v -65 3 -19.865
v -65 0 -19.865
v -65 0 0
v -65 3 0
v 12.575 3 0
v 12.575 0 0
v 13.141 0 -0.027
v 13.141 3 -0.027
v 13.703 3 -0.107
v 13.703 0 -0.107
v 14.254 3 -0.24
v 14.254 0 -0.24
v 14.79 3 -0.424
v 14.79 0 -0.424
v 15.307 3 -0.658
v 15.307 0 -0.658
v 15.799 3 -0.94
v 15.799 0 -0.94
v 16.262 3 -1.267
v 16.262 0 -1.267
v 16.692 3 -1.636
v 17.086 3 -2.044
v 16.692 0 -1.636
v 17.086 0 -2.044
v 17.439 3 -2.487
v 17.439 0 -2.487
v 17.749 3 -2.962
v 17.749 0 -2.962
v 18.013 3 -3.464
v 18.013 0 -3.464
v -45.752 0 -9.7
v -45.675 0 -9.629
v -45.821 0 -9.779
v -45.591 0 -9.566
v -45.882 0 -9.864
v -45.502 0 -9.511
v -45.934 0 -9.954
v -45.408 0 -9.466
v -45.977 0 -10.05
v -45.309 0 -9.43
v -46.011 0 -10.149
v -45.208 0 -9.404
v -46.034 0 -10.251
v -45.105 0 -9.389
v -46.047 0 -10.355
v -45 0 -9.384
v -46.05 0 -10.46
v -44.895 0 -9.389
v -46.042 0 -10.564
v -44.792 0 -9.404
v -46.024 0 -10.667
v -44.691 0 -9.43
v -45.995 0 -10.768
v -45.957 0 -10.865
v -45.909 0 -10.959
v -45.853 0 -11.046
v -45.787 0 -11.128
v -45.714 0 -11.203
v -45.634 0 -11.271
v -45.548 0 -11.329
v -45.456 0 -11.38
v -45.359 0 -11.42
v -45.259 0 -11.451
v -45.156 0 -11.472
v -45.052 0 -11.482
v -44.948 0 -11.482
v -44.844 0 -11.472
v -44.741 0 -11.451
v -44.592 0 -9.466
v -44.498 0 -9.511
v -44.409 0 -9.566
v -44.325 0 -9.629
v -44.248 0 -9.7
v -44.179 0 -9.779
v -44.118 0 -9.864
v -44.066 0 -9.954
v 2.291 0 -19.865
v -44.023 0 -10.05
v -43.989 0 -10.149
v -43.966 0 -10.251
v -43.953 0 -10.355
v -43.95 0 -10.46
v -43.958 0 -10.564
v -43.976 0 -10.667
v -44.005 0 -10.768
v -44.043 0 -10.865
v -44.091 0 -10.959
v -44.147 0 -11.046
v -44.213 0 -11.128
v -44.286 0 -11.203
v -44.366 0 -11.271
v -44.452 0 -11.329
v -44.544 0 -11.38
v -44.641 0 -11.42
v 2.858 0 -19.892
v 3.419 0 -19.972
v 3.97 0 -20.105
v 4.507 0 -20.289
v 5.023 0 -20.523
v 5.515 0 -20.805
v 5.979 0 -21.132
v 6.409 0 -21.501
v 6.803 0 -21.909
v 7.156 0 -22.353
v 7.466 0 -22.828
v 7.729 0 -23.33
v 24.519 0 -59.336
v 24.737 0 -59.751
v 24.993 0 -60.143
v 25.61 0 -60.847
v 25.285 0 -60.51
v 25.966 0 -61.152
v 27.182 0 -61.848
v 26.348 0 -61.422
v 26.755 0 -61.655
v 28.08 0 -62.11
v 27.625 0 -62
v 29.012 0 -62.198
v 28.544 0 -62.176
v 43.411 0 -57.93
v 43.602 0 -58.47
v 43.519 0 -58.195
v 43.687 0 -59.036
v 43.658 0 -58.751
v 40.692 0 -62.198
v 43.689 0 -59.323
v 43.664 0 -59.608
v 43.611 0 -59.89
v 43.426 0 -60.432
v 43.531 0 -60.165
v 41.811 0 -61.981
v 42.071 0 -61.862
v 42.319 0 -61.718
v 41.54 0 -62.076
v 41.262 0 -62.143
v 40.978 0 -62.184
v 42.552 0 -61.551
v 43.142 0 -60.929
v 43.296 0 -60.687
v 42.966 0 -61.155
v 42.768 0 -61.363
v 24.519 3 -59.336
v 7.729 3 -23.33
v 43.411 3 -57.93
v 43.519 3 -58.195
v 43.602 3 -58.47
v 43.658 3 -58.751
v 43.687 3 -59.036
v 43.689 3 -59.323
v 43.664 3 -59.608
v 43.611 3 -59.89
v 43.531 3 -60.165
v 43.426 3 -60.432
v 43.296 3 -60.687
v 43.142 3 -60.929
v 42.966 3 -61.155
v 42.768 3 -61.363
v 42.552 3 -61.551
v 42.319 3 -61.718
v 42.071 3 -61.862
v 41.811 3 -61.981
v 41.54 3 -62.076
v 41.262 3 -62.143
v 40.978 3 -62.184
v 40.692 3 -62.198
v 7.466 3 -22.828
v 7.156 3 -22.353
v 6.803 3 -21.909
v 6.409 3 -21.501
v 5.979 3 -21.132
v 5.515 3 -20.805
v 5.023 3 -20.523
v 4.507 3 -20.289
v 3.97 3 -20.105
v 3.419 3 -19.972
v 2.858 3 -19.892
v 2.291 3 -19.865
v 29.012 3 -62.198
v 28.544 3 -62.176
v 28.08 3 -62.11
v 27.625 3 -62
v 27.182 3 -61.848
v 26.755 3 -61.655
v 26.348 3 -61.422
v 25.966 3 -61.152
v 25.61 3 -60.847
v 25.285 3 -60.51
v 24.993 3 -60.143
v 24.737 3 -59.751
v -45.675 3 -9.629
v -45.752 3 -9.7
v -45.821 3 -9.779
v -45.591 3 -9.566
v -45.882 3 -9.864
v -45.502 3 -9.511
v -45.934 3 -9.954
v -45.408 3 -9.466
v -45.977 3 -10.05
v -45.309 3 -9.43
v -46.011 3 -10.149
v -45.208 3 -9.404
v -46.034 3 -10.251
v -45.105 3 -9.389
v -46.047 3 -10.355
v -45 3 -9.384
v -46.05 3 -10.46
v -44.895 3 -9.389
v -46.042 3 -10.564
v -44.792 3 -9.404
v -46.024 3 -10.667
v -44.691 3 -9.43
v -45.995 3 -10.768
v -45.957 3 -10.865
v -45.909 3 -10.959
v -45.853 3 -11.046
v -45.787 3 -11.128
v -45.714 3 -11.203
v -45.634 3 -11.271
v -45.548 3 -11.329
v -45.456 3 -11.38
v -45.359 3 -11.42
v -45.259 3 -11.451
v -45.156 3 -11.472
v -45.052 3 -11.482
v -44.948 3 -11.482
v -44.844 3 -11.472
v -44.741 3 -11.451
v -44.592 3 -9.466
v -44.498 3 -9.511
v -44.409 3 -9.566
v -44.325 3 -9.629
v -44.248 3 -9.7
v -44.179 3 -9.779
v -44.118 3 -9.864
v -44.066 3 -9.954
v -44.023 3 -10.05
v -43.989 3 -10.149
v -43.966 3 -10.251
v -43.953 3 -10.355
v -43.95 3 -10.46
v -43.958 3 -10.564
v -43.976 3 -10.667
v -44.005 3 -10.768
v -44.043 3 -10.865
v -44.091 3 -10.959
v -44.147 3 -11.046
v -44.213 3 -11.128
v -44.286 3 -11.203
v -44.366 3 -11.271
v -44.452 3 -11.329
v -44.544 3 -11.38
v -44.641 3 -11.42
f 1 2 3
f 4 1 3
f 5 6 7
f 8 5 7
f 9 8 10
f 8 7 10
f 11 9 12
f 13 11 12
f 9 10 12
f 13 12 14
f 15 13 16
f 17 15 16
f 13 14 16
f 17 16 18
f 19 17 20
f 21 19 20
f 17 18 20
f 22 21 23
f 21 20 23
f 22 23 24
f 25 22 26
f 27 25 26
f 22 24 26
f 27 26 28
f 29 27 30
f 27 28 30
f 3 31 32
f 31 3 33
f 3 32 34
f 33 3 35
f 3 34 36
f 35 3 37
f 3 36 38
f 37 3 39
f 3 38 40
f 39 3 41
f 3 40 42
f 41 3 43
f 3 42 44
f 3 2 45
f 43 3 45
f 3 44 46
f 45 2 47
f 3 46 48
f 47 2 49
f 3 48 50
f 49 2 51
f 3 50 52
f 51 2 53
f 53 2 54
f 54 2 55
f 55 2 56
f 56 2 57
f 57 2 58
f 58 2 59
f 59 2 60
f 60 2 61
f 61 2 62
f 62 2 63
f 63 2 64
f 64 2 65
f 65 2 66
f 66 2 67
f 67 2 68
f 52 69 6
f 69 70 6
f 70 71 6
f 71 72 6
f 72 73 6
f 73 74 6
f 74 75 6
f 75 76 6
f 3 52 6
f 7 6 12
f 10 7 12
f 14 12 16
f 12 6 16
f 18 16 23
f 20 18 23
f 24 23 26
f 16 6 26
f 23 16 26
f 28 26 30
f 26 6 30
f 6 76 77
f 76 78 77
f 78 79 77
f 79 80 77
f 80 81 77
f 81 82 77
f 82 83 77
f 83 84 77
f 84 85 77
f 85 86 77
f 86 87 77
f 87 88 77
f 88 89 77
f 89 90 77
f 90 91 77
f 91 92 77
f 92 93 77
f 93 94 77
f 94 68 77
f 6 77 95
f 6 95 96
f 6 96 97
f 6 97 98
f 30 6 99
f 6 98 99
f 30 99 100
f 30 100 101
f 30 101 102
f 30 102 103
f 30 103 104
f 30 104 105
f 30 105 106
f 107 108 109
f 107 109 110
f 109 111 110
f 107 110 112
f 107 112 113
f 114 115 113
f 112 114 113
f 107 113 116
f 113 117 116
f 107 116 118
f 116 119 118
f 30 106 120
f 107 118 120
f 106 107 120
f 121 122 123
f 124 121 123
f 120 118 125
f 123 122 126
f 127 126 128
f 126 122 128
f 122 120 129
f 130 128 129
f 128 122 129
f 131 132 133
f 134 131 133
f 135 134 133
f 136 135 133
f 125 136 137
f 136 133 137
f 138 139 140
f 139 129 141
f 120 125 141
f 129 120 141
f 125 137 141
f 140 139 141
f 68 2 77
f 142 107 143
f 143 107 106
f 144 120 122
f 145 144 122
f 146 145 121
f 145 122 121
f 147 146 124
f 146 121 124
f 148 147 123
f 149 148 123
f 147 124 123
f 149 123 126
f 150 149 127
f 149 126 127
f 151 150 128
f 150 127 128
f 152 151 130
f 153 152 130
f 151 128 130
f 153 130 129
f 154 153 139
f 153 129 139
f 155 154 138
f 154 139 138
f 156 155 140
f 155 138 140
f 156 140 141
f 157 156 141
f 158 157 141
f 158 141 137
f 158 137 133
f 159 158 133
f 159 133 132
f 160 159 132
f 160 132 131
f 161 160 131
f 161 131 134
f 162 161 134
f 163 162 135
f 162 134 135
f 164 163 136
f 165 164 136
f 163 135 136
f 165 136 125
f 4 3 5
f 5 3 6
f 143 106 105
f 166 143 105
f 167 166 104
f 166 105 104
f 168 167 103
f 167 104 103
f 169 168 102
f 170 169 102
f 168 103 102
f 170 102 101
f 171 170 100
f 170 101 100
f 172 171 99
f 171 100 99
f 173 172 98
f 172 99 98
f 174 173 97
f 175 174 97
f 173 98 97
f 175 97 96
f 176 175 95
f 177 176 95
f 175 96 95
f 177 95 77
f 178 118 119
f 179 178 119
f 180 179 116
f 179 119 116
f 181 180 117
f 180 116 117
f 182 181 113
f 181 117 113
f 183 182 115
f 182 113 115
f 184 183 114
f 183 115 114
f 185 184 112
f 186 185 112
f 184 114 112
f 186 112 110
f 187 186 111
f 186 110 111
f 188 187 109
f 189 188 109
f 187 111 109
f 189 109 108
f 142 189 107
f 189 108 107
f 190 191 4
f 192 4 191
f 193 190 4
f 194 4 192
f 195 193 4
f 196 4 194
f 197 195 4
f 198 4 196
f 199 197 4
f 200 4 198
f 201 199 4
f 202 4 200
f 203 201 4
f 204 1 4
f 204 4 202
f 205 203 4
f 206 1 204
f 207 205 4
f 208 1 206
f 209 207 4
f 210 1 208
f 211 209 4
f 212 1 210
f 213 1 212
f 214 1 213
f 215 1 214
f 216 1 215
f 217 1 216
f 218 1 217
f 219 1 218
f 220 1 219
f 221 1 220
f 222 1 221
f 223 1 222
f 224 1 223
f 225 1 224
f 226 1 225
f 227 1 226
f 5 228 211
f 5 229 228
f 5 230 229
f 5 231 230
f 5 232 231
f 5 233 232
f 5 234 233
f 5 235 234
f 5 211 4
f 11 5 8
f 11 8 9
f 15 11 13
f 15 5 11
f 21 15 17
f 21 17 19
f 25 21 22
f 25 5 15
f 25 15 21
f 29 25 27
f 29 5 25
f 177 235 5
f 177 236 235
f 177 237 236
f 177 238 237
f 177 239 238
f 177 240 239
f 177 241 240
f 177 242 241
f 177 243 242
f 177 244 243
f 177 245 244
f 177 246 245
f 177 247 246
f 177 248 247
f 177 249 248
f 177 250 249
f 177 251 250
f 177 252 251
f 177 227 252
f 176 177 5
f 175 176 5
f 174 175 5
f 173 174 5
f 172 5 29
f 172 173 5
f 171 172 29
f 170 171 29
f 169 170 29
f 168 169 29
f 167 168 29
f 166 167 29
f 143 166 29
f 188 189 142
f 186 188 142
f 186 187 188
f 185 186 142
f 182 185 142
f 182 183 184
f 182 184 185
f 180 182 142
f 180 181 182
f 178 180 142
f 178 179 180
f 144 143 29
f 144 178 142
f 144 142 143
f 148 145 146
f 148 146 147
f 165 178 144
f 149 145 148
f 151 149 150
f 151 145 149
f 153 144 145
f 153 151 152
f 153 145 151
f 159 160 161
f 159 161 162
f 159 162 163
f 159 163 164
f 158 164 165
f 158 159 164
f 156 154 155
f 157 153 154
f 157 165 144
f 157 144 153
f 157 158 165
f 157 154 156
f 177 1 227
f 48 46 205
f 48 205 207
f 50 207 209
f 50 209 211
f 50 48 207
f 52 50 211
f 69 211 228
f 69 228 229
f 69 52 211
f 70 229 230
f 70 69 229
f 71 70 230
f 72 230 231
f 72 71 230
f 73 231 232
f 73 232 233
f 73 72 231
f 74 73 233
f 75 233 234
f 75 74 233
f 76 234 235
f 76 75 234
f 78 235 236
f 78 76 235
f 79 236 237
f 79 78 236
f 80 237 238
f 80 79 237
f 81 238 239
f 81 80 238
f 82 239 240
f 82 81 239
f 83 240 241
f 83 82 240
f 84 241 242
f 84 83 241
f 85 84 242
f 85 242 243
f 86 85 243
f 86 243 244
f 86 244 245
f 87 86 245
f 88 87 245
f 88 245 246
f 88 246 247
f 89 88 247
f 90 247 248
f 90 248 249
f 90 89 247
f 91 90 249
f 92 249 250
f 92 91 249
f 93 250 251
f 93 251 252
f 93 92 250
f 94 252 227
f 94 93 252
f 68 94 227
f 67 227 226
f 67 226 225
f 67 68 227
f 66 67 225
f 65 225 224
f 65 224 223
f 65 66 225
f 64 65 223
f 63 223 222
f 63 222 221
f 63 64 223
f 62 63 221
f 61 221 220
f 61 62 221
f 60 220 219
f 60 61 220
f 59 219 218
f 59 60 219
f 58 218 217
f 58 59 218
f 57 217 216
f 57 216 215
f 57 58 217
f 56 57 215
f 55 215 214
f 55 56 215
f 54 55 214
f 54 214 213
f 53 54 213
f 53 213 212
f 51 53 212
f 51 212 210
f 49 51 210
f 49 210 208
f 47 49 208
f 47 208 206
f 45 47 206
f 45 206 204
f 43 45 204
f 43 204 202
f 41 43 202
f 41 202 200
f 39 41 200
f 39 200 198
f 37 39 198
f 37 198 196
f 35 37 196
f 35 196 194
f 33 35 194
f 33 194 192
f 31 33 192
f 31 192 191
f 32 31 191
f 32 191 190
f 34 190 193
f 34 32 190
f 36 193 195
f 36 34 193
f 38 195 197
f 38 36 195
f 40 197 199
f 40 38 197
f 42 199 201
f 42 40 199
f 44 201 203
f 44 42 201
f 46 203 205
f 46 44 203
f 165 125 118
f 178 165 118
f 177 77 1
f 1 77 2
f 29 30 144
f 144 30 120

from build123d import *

# Parameters (mm, degrees)
ESBO_O1_R                = 1.05
RESSALTO_EXTRUS_O1_DEPTH = 3


with BuildPart() as part:
    # Esboço1 → Ressalto-extrusão1 (new body)
    with BuildSketch(Plane(origin=(0, 0, 0), x_dir=(1, 0, 0), z_dir=(0, 1, 0))):
        with BuildLine():
            Line((-65, 19.865476825), (-65, 0))
            Line((-65, 0), (0, 0))
            Line((0, 0), (12.574875441, 0))
            ThreePointArc((12.574875441, 0), (15.798673091, 0.939651325), (18.012722163, 3.46429043))
            Line((18.012722163, 3.46429043), (43.410601428, 57.93021828))
            ThreePointArc((43.410601428, 57.93021828), (43.221852405, 60.80997189), (40.691678067, 62.198073065))
            Line((40.691678067, 62.198073065), (29.011685815, 62.198073065))
            ThreePointArc((29.011685815, 62.198073065), (26.348436448, 61.421806665), (24.519362347, 59.336147382))
            Line((24.519362347, 59.336147382), (7.729311551, 23.329767255))
            ThreePointArc((7.729311551, 23.329767255), (5.515262479, 20.80512815), (2.291464829, 19.865476825))
            Line((2.291464829, 19.865476825), (-65, 19.865476825))
        make_face()
        with Locations(Location((-45, 10.43351307, 0), (0, 0, 270))):
            Circle(ESBO_O1_R, mode=Mode.SUBTRACT)
    extrude(amount=RESSALTO_EXTRUS_O1_DEPTH)


solid = part.part
